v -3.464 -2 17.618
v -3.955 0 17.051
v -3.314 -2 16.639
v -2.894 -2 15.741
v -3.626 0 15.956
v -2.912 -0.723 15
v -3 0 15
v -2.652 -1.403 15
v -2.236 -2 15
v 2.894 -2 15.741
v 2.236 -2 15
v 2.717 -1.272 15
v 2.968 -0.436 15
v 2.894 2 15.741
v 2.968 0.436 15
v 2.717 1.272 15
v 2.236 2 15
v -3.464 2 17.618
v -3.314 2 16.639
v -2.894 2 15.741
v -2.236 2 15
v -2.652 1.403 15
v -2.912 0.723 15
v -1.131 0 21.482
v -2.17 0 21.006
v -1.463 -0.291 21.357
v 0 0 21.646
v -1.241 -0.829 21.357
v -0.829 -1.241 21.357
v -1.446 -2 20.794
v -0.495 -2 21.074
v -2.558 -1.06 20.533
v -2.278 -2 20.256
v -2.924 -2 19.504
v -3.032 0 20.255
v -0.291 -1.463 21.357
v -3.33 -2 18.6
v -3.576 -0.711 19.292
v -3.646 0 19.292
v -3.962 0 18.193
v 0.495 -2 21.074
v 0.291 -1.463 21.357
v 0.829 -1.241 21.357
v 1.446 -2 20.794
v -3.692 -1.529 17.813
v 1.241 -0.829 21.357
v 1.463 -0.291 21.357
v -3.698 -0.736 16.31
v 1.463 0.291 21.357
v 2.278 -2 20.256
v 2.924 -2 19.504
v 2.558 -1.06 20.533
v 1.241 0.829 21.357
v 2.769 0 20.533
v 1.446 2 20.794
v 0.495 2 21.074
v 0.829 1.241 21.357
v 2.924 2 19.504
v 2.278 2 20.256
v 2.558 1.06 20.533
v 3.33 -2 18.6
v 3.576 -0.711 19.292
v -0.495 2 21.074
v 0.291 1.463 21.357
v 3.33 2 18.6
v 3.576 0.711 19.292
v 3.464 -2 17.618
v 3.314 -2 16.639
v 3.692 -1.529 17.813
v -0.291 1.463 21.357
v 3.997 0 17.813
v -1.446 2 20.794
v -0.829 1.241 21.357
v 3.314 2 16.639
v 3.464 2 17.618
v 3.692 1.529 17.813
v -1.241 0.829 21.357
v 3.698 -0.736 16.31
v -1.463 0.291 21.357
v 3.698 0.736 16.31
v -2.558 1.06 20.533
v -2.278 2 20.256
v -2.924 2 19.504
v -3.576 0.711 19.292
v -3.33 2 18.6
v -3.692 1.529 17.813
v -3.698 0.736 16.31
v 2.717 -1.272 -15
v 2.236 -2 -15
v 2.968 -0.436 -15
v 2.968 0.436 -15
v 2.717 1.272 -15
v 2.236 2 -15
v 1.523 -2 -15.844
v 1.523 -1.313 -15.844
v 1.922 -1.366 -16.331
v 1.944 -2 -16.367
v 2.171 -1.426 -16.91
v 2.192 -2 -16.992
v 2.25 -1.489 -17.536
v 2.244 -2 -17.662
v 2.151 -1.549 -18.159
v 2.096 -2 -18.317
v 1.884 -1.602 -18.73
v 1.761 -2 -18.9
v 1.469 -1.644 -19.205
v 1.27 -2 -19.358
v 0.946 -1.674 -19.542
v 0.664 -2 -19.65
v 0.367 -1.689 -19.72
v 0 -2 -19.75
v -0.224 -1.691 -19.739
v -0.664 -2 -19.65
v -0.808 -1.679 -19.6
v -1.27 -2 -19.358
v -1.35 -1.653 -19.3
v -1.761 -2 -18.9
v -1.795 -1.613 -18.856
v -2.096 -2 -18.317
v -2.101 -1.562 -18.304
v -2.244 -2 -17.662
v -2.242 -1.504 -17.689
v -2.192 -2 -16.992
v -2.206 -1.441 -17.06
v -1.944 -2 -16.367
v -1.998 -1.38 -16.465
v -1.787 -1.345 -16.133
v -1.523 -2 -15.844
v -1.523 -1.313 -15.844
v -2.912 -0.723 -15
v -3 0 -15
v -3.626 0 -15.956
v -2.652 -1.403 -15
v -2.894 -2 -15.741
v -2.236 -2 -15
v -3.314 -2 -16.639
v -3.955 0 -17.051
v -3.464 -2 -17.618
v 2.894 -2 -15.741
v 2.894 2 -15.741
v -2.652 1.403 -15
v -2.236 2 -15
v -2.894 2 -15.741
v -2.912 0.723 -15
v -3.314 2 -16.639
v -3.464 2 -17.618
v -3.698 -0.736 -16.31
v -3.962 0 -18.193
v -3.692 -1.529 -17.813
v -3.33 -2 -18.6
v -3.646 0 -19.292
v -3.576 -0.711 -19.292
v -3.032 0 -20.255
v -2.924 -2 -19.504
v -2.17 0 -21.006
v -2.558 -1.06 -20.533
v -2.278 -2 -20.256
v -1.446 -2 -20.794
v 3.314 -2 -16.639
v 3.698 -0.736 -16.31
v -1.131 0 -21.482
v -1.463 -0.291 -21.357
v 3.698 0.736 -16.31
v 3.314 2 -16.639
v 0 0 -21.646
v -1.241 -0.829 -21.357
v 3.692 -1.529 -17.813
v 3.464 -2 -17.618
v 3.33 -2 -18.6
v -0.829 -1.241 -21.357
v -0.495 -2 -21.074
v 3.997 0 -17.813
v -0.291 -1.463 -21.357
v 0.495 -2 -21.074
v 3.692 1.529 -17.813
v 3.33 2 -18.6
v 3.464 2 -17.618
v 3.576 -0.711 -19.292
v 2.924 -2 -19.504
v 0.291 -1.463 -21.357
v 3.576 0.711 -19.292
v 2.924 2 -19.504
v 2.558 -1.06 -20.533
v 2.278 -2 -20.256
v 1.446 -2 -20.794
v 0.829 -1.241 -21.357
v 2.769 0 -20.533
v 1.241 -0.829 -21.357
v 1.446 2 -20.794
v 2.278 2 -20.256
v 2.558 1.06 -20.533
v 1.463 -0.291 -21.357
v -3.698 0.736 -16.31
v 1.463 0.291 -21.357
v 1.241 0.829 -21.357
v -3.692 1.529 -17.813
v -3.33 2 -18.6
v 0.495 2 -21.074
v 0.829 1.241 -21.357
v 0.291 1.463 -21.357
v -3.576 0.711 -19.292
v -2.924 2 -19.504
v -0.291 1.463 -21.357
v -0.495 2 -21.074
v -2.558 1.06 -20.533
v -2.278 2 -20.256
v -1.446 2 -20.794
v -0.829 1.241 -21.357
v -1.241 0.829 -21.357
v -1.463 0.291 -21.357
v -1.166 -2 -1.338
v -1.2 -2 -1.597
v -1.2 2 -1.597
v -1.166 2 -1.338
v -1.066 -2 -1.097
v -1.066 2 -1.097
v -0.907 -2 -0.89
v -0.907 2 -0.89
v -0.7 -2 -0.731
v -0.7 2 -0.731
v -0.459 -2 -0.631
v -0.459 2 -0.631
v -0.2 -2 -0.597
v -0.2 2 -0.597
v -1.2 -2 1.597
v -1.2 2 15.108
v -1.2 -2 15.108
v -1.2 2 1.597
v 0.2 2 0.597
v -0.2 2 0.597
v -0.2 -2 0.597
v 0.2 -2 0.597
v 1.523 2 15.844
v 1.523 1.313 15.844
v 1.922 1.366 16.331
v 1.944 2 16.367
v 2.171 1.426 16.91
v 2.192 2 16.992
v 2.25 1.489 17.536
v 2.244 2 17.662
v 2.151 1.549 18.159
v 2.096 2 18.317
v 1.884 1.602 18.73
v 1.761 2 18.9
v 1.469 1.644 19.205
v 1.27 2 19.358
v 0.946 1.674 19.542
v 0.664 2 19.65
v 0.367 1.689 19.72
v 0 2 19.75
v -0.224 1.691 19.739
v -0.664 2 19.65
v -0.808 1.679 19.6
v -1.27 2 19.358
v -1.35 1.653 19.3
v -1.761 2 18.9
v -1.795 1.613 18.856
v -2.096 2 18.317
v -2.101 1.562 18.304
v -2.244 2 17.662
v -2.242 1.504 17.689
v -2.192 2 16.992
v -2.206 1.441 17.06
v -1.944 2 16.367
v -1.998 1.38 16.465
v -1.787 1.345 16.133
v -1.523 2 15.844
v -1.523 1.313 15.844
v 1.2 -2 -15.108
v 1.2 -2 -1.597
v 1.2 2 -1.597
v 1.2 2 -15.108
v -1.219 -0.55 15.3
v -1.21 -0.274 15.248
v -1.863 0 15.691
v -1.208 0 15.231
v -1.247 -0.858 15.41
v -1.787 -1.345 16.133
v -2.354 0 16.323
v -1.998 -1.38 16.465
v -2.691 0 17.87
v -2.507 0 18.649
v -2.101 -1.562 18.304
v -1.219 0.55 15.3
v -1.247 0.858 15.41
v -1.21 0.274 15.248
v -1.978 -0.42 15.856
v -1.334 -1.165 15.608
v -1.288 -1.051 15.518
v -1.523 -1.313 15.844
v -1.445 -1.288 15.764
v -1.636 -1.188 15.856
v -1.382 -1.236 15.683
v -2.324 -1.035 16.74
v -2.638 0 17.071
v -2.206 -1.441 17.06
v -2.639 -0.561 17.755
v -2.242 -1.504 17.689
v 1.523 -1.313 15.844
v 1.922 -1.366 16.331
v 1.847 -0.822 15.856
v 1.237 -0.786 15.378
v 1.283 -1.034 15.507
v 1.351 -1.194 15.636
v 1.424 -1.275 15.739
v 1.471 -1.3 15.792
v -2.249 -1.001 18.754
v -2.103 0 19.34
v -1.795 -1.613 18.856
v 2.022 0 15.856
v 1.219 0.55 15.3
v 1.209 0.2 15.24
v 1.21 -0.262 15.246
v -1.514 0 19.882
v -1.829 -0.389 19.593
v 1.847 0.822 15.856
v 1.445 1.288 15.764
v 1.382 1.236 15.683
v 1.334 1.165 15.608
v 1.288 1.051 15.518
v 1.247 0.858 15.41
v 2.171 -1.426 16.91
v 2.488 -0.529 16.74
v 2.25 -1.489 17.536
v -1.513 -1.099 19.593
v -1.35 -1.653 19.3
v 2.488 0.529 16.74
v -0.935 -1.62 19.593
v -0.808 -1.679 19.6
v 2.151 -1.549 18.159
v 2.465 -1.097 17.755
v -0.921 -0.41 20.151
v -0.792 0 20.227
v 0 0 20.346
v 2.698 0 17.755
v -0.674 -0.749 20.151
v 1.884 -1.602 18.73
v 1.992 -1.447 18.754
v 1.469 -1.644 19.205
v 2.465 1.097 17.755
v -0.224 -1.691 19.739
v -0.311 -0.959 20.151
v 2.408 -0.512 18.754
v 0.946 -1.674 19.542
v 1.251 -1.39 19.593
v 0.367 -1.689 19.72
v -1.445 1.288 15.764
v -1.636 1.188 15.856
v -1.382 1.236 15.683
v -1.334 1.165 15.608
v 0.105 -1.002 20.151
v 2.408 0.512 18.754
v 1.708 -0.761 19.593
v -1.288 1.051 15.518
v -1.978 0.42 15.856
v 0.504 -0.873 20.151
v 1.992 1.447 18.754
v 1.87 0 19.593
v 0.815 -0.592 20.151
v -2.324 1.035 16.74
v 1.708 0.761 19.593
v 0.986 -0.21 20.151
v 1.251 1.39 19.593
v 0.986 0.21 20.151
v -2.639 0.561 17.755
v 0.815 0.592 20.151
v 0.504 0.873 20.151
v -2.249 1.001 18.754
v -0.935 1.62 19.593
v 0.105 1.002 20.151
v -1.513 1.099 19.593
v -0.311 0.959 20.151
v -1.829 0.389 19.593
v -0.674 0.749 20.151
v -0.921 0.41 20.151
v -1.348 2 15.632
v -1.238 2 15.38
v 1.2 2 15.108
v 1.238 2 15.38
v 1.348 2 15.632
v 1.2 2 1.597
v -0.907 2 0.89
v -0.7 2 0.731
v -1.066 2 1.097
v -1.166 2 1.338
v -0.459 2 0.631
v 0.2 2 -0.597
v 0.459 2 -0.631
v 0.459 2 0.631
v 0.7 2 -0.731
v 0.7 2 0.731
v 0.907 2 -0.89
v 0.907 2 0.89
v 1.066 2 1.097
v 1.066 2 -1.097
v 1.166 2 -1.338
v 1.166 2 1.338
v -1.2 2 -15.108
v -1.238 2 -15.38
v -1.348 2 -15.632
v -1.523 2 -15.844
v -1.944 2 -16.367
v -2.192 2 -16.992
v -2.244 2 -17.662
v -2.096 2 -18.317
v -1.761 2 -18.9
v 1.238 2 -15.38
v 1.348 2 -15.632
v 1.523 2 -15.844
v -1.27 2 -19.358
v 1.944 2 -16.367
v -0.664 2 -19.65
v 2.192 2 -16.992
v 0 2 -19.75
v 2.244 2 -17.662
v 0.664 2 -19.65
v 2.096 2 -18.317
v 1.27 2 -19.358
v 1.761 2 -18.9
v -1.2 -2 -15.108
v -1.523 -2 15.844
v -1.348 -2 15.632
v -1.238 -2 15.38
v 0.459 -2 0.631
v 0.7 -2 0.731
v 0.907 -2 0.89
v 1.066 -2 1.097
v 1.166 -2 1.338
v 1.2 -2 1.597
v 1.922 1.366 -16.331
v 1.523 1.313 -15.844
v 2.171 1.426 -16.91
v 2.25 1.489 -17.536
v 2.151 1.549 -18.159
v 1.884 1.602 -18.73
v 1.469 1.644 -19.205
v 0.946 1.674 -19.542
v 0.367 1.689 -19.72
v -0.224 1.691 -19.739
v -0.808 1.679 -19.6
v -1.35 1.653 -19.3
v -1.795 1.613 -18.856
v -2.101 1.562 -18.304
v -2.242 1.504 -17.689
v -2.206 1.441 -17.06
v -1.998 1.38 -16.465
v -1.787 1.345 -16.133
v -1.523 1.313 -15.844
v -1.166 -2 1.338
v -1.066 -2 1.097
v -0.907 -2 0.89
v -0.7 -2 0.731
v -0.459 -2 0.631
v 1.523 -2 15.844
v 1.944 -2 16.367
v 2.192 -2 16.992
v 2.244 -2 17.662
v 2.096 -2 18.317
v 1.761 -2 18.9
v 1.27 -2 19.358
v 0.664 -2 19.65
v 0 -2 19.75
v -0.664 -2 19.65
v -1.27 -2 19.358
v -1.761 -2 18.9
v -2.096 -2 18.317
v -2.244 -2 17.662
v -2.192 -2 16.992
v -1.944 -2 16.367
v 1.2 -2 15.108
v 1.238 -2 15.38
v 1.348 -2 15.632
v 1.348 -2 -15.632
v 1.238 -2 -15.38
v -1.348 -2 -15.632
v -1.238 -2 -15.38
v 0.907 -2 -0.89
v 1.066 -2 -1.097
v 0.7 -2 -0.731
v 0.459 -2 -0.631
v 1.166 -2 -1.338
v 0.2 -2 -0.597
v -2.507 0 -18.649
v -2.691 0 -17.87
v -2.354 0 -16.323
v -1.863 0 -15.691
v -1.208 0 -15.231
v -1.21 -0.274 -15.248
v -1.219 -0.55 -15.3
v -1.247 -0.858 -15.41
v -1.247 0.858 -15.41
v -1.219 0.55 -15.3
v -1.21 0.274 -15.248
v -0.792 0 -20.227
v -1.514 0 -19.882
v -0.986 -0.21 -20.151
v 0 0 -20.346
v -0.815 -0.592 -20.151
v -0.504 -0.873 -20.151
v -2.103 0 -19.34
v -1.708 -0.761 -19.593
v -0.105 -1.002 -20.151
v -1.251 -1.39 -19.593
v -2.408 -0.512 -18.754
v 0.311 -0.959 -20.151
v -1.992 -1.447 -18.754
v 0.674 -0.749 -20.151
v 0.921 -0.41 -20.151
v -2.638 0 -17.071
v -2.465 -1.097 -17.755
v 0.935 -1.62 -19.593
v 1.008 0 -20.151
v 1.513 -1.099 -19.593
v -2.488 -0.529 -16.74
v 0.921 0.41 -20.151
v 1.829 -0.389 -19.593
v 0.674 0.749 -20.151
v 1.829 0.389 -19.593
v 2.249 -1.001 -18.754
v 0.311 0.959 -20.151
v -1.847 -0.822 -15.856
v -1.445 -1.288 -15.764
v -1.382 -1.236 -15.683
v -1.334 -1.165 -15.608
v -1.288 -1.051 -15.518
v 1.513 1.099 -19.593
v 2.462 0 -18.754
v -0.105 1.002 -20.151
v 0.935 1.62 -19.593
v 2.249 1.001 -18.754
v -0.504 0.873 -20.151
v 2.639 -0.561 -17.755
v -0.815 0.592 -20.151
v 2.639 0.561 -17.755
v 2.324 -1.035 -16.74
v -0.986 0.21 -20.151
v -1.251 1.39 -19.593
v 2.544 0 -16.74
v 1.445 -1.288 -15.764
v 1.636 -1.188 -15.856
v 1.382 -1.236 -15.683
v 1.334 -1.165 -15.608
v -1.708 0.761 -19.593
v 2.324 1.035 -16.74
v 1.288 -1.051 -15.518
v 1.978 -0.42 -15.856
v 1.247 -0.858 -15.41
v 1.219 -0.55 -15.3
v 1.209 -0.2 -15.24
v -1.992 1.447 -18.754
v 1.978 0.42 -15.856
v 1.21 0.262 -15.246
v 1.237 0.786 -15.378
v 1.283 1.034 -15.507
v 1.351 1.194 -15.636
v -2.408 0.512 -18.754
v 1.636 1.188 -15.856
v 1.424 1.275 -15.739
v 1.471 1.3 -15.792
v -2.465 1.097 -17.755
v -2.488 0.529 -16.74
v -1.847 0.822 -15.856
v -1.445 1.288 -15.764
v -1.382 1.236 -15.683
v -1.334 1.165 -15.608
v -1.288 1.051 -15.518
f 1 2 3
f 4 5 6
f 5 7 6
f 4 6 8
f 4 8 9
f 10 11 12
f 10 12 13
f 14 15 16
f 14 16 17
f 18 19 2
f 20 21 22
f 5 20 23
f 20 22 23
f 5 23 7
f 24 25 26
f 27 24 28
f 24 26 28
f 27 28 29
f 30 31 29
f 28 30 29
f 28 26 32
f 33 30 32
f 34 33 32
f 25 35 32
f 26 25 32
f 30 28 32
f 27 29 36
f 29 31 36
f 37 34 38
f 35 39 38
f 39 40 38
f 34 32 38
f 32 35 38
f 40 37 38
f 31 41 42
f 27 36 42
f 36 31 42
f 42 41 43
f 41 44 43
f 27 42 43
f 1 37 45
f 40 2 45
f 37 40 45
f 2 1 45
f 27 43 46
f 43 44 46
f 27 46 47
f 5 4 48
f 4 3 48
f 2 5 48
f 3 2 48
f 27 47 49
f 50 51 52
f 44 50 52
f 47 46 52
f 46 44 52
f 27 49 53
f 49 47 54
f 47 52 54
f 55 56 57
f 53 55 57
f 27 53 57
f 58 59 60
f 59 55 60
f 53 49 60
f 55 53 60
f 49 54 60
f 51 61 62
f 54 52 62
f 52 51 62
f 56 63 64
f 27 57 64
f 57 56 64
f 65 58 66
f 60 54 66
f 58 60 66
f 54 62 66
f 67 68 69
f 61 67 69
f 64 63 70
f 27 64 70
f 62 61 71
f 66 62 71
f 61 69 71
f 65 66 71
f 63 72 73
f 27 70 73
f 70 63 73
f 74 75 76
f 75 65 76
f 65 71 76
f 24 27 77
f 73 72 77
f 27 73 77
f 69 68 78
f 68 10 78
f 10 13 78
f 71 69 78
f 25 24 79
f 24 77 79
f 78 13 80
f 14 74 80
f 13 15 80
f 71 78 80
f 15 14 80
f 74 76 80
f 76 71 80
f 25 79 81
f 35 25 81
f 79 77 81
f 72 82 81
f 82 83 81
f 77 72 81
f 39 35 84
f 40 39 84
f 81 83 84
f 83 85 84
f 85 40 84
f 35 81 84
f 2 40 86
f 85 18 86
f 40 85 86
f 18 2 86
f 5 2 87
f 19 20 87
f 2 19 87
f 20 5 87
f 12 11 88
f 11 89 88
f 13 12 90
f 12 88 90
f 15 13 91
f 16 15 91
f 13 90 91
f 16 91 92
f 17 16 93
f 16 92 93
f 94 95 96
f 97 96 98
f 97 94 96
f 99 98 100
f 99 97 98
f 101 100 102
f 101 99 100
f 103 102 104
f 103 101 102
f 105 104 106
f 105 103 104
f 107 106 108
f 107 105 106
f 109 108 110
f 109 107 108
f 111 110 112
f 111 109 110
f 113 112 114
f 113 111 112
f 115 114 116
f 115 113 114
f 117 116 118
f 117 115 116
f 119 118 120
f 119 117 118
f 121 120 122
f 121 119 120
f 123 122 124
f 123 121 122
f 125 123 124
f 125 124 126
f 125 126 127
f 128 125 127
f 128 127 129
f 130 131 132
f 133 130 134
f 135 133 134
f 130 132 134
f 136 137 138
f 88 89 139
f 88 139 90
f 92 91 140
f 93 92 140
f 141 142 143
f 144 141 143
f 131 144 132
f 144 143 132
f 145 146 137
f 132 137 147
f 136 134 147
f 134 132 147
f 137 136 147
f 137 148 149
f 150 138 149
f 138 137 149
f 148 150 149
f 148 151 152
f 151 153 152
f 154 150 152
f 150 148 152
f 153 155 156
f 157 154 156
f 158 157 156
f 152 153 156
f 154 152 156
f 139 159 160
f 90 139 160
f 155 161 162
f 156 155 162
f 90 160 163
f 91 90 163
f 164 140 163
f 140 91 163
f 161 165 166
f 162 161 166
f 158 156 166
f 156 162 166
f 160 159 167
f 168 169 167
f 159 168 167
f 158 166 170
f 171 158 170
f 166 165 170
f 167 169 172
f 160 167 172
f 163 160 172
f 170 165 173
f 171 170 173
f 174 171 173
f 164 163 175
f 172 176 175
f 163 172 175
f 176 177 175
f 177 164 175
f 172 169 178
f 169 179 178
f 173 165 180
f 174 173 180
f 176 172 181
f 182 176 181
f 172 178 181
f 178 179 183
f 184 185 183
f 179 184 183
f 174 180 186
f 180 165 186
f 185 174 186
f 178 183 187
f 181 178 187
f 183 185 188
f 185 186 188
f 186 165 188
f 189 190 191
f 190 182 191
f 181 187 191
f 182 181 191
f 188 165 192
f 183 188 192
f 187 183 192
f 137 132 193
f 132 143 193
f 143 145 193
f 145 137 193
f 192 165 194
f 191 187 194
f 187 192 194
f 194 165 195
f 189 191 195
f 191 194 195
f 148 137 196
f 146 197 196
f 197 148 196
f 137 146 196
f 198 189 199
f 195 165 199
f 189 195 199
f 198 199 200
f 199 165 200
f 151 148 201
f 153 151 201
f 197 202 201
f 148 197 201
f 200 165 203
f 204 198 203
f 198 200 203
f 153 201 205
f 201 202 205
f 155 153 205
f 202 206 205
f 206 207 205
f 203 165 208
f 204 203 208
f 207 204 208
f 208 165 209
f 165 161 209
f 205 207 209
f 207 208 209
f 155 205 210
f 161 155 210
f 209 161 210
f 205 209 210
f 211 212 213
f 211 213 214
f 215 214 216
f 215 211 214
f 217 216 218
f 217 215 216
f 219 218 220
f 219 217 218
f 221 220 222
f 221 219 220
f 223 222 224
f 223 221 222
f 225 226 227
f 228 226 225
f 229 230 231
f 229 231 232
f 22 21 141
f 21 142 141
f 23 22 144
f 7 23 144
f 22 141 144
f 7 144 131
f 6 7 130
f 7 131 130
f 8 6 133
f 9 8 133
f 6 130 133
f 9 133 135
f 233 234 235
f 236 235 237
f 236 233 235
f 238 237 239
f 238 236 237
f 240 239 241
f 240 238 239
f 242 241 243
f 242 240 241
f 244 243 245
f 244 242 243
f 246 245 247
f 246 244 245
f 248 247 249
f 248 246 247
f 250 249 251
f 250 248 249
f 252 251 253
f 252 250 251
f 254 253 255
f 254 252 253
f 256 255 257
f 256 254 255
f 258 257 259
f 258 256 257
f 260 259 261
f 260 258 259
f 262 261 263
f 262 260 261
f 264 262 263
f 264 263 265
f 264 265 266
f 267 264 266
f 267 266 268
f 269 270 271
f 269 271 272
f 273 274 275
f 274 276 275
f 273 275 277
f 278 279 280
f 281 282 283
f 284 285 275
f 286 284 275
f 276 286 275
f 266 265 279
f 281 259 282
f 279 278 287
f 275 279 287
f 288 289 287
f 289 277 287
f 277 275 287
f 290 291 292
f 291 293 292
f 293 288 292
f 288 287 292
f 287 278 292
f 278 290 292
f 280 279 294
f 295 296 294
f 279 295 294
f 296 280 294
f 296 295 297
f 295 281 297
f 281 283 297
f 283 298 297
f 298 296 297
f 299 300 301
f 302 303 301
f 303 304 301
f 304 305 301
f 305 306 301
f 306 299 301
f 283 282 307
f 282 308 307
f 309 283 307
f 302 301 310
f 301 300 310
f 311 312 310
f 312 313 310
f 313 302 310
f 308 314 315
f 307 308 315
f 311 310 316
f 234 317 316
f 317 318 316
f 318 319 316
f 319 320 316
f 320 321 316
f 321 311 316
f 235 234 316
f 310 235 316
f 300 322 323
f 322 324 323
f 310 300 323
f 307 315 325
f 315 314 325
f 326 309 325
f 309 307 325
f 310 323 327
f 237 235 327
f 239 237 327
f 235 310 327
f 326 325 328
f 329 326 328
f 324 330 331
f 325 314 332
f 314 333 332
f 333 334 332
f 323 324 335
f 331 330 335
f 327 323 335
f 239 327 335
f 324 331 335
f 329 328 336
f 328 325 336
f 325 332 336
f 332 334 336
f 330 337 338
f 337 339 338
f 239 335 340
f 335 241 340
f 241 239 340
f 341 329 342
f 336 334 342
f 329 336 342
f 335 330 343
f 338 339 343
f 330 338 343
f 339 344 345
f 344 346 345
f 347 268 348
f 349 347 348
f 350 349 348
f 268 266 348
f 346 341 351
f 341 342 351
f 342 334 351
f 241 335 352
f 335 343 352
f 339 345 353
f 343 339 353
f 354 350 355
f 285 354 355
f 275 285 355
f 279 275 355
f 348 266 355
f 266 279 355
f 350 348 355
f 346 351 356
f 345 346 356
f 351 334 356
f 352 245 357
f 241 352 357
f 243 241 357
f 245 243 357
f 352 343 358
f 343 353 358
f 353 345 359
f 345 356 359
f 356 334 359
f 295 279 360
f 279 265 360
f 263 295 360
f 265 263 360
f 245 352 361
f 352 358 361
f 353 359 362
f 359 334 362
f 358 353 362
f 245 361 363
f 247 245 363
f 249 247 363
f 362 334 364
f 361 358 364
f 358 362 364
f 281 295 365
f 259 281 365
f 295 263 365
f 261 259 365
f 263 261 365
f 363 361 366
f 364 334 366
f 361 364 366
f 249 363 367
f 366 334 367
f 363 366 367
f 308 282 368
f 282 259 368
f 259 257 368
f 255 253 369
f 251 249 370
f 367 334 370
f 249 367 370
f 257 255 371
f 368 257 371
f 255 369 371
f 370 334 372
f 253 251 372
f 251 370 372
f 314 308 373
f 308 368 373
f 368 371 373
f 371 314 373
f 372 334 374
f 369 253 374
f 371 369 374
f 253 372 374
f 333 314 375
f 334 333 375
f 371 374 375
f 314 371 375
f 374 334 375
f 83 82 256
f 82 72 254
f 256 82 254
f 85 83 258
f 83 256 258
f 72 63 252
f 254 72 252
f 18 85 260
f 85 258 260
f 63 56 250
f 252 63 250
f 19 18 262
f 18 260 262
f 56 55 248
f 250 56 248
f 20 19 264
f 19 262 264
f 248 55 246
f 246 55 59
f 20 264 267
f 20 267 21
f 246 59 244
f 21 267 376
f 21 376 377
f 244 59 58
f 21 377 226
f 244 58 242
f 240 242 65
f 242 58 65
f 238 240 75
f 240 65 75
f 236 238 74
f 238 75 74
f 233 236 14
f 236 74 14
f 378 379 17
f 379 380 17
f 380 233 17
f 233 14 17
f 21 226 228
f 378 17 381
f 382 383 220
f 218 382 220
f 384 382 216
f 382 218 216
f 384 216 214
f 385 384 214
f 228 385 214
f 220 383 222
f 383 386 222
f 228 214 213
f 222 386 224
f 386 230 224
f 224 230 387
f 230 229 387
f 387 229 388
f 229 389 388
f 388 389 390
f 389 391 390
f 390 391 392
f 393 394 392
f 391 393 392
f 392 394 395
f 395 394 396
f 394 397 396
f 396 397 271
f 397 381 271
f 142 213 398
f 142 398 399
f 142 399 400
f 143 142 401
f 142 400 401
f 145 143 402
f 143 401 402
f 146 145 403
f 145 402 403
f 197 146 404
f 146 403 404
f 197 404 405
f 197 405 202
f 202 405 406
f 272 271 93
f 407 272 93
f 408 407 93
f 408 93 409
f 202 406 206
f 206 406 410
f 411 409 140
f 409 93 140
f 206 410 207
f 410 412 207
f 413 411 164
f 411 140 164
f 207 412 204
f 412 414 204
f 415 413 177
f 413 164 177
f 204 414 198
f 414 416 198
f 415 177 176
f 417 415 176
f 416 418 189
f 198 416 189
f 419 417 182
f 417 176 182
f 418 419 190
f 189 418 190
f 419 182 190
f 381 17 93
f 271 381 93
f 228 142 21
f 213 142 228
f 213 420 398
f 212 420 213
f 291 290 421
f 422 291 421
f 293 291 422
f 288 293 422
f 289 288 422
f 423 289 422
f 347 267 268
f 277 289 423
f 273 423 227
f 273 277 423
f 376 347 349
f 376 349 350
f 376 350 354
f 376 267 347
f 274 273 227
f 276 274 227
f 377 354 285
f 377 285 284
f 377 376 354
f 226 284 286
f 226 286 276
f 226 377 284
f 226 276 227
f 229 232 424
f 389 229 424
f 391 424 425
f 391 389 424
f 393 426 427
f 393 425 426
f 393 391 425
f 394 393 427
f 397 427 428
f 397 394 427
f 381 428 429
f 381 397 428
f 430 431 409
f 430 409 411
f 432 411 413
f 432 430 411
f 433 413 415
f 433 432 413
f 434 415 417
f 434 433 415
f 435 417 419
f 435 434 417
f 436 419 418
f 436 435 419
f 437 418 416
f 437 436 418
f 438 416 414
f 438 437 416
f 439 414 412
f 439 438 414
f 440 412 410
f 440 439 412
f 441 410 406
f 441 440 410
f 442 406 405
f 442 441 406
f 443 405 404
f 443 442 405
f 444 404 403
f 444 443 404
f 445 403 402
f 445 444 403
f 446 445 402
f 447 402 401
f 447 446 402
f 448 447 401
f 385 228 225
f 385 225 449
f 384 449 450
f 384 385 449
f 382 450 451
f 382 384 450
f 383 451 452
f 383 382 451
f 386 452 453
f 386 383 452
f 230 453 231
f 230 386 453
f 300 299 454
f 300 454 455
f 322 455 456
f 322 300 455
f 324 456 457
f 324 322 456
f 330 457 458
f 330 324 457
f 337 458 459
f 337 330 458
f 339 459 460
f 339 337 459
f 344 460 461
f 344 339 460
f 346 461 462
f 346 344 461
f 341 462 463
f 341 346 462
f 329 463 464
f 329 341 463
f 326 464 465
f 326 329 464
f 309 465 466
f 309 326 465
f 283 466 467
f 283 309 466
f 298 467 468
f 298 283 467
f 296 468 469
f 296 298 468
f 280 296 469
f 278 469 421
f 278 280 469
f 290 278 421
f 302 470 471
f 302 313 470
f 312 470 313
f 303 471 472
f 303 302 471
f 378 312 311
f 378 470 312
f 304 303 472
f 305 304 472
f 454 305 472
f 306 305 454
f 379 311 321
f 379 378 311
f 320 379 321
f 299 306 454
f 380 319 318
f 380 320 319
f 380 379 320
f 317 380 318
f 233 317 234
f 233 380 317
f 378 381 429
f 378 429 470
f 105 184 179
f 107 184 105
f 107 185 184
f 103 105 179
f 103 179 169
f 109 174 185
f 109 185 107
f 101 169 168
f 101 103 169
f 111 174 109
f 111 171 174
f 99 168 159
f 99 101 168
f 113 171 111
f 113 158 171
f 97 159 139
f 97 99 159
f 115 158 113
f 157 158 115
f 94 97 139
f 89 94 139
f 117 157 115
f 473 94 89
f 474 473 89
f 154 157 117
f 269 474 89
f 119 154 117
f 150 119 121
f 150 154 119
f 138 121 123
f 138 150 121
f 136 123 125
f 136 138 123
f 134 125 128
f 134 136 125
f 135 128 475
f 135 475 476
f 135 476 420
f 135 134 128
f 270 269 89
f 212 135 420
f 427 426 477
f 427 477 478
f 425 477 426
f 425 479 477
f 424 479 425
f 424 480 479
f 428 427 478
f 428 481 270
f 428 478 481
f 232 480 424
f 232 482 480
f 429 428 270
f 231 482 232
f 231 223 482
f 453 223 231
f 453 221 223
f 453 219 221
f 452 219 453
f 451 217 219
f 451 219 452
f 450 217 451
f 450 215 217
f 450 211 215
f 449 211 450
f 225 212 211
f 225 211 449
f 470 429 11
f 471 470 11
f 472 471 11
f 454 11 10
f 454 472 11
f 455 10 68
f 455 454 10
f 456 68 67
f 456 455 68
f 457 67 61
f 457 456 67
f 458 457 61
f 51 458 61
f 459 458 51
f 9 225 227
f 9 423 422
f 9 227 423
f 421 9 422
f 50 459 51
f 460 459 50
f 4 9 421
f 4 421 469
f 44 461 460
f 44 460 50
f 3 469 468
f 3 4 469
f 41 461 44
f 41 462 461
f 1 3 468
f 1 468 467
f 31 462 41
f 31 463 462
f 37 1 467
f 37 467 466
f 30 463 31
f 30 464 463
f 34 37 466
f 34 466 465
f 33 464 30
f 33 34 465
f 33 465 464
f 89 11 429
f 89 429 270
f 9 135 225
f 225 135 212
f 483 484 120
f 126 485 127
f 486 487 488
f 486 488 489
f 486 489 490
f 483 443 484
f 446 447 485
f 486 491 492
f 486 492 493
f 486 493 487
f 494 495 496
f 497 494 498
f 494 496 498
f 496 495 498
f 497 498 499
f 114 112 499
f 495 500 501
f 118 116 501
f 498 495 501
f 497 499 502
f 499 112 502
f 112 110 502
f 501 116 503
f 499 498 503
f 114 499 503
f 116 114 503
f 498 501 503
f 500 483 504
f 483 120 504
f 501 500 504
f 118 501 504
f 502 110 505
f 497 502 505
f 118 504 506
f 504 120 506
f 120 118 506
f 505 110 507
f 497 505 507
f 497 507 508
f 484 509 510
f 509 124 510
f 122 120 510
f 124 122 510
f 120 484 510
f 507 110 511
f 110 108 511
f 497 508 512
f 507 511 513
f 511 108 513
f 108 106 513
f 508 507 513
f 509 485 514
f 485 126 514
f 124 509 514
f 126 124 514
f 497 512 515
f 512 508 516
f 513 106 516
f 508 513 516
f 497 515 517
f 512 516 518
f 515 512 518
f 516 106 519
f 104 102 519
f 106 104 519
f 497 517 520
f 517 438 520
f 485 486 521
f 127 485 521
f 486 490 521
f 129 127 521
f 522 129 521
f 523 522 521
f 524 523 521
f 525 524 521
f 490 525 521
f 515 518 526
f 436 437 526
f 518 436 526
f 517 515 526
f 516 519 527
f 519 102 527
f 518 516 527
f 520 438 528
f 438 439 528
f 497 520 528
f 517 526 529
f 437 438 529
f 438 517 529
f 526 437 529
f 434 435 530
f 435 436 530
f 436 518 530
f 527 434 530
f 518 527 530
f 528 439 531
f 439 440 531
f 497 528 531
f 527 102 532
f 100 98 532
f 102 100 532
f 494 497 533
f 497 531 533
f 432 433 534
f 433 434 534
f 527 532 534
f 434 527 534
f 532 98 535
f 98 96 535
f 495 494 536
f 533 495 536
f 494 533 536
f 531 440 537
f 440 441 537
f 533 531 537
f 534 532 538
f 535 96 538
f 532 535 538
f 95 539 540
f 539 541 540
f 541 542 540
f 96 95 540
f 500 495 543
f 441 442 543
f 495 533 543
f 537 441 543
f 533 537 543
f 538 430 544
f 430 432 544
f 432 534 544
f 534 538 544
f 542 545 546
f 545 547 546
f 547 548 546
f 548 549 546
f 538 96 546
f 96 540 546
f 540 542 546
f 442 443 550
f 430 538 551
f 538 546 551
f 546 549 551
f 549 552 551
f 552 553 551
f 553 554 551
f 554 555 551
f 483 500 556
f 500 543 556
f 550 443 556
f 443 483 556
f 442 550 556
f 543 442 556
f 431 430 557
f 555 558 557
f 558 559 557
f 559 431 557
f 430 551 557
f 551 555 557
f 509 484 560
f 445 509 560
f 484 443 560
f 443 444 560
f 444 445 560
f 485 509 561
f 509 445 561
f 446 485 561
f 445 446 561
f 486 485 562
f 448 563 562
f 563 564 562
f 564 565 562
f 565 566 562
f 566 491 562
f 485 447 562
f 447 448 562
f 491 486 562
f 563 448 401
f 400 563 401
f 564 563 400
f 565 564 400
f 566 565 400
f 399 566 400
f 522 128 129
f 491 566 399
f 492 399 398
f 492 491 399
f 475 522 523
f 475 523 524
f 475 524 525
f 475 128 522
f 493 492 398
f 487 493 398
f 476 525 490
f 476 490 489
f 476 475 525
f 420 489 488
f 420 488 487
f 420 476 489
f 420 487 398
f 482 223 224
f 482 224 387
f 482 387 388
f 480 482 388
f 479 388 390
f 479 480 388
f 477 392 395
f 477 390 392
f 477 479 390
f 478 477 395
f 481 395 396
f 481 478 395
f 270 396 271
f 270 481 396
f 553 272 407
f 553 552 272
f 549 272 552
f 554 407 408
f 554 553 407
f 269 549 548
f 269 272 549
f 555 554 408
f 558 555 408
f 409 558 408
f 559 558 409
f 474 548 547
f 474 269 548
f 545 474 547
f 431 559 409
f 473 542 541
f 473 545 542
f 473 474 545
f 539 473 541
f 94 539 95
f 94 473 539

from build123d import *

# Parameters (mm, degrees)
CUT_EXTRUDE1_DEPTH = 30
CUT_EXTRUDE2_DEPTH = 30


with BuildPart() as part:
    # Sketch1 → Revolve1 (revolve)
    with BuildSketch(Plane(origin=(0, 0, 0), x_dir=(1, 0, 0), z_dir=(0, 1, 0))):
        with BuildLine():
            Line((-3, -15), (-3, 15))
            ThreePointArc((-3, 15), (-3.645751311, 19.291502622), (0, 21.645751311))
            Line((0, 21.645751311), (0, 20.345751311))
            ThreePointArc((0, 20.345751311), (-2.7, 17.645751311), (0, 14.945751311))
            Line((0, 14.945751311), (0, 13.645751311))
            Line((0, 13.645751311), (0, -13.645751311))
            Line((0, -13.645751311), (0, -14.945751311))
            ThreePointArc((0, -14.945751311), (-2.7, -17.645751311), (0, -20.345751311))
            Line((0, -20.345751311), (0, -21.645751311))
            ThreePointArc((0, -21.645751311), (-3.645751311, -19.291502622), (-3, -15))
        make_face()
    revolve(axis=Axis((0, 0, -91.394122854), (0, 0, 1)))

    # Sketch2 → Cut-Extrude1 (cut, symmetric)
    with BuildSketch(Plane(origin=(0, 0, 0), x_dir=(1, 0, 0), z_dir=(0, 1, 0))):
        with BuildLine():
            Line((-1.2, 15.107825257), (-1.2, 1.596713369))
            ThreePointArc((-1.2, 1.596713369), (-0.907106781, 0.889606588), (-0.2, 0.596713369))
            Line((-0.2, 0.596713369), (0.2, 0.596713369))
            ThreePointArc((0.2, 0.596713369), (0.907106781, 0.889606588), (1.2, 1.596713369))
            Line((1.2, 1.596713369), (1.2, 15.107825257))
            ThreePointArc((1.2, 15.107825257), (1.284324545, 15.509743733), (1.523076923, 15.843879024))
            ThreePointArc((1.523076923, 15.843879024), (0, 19.75), (-1.523076923, 15.843879024))
            ThreePointArc((-1.523076923, 15.843879024), (-1.284324545, 15.509743733), (-1.2, 15.107825257))
        make_face()
        with BuildLine():
            Line((-1.2, -15.107825257), (-1.2, -1.596713369))
            ThreePointArc((-1.2, -1.596713369), (-0.907106781, -0.889606588), (-0.2, -0.596713369))
            Line((-0.2, -0.596713369), (0.2, -0.596713369))
            ThreePointArc((0.2, -0.596713369), (0.907106781, -0.889606588), (1.2, -1.596713369))
            Line((1.2, -1.596713369), (1.2, -15.107825257))
            ThreePointArc((1.2, -15.107825257), (1.284324545, -15.509743733), (1.523076923, -15.843879024))
            ThreePointArc((1.523076923, -15.843879024), (0, -19.75), (-1.523076923, -15.843879024))
            ThreePointArc((-1.523076923, -15.843879024), (-1.284324545, -15.509743733), (-1.2, -15.107825257))
        make_face()
    extrude(amount=CUT_EXTRUDE1_DEPTH, both=True, mode=Mode.SUBTRACT)

    # Sketch3 → Cut-Extrude2 (cut, symmetric)
    with BuildSketch(Plane(origin=(0, 0, 0), x_dir=(0, 0, -1), z_dir=(1, 0, 0))):
        Polygon((0, -2), (70.025003907, -2), (70.025003907, -4), (-79.974996093, -4), (-79.974996093, -2), align=None)
        Polygon((0, 2), (70.025003907, 2), (70.025003907, 4), (-79.974996093, 4), (-79.974996093, 2), align=None)
    extrude(amount=CUT_EXTRUDE2_DEPTH, both=True, mode=Mode.SUBTRACT)


solid = part.part
